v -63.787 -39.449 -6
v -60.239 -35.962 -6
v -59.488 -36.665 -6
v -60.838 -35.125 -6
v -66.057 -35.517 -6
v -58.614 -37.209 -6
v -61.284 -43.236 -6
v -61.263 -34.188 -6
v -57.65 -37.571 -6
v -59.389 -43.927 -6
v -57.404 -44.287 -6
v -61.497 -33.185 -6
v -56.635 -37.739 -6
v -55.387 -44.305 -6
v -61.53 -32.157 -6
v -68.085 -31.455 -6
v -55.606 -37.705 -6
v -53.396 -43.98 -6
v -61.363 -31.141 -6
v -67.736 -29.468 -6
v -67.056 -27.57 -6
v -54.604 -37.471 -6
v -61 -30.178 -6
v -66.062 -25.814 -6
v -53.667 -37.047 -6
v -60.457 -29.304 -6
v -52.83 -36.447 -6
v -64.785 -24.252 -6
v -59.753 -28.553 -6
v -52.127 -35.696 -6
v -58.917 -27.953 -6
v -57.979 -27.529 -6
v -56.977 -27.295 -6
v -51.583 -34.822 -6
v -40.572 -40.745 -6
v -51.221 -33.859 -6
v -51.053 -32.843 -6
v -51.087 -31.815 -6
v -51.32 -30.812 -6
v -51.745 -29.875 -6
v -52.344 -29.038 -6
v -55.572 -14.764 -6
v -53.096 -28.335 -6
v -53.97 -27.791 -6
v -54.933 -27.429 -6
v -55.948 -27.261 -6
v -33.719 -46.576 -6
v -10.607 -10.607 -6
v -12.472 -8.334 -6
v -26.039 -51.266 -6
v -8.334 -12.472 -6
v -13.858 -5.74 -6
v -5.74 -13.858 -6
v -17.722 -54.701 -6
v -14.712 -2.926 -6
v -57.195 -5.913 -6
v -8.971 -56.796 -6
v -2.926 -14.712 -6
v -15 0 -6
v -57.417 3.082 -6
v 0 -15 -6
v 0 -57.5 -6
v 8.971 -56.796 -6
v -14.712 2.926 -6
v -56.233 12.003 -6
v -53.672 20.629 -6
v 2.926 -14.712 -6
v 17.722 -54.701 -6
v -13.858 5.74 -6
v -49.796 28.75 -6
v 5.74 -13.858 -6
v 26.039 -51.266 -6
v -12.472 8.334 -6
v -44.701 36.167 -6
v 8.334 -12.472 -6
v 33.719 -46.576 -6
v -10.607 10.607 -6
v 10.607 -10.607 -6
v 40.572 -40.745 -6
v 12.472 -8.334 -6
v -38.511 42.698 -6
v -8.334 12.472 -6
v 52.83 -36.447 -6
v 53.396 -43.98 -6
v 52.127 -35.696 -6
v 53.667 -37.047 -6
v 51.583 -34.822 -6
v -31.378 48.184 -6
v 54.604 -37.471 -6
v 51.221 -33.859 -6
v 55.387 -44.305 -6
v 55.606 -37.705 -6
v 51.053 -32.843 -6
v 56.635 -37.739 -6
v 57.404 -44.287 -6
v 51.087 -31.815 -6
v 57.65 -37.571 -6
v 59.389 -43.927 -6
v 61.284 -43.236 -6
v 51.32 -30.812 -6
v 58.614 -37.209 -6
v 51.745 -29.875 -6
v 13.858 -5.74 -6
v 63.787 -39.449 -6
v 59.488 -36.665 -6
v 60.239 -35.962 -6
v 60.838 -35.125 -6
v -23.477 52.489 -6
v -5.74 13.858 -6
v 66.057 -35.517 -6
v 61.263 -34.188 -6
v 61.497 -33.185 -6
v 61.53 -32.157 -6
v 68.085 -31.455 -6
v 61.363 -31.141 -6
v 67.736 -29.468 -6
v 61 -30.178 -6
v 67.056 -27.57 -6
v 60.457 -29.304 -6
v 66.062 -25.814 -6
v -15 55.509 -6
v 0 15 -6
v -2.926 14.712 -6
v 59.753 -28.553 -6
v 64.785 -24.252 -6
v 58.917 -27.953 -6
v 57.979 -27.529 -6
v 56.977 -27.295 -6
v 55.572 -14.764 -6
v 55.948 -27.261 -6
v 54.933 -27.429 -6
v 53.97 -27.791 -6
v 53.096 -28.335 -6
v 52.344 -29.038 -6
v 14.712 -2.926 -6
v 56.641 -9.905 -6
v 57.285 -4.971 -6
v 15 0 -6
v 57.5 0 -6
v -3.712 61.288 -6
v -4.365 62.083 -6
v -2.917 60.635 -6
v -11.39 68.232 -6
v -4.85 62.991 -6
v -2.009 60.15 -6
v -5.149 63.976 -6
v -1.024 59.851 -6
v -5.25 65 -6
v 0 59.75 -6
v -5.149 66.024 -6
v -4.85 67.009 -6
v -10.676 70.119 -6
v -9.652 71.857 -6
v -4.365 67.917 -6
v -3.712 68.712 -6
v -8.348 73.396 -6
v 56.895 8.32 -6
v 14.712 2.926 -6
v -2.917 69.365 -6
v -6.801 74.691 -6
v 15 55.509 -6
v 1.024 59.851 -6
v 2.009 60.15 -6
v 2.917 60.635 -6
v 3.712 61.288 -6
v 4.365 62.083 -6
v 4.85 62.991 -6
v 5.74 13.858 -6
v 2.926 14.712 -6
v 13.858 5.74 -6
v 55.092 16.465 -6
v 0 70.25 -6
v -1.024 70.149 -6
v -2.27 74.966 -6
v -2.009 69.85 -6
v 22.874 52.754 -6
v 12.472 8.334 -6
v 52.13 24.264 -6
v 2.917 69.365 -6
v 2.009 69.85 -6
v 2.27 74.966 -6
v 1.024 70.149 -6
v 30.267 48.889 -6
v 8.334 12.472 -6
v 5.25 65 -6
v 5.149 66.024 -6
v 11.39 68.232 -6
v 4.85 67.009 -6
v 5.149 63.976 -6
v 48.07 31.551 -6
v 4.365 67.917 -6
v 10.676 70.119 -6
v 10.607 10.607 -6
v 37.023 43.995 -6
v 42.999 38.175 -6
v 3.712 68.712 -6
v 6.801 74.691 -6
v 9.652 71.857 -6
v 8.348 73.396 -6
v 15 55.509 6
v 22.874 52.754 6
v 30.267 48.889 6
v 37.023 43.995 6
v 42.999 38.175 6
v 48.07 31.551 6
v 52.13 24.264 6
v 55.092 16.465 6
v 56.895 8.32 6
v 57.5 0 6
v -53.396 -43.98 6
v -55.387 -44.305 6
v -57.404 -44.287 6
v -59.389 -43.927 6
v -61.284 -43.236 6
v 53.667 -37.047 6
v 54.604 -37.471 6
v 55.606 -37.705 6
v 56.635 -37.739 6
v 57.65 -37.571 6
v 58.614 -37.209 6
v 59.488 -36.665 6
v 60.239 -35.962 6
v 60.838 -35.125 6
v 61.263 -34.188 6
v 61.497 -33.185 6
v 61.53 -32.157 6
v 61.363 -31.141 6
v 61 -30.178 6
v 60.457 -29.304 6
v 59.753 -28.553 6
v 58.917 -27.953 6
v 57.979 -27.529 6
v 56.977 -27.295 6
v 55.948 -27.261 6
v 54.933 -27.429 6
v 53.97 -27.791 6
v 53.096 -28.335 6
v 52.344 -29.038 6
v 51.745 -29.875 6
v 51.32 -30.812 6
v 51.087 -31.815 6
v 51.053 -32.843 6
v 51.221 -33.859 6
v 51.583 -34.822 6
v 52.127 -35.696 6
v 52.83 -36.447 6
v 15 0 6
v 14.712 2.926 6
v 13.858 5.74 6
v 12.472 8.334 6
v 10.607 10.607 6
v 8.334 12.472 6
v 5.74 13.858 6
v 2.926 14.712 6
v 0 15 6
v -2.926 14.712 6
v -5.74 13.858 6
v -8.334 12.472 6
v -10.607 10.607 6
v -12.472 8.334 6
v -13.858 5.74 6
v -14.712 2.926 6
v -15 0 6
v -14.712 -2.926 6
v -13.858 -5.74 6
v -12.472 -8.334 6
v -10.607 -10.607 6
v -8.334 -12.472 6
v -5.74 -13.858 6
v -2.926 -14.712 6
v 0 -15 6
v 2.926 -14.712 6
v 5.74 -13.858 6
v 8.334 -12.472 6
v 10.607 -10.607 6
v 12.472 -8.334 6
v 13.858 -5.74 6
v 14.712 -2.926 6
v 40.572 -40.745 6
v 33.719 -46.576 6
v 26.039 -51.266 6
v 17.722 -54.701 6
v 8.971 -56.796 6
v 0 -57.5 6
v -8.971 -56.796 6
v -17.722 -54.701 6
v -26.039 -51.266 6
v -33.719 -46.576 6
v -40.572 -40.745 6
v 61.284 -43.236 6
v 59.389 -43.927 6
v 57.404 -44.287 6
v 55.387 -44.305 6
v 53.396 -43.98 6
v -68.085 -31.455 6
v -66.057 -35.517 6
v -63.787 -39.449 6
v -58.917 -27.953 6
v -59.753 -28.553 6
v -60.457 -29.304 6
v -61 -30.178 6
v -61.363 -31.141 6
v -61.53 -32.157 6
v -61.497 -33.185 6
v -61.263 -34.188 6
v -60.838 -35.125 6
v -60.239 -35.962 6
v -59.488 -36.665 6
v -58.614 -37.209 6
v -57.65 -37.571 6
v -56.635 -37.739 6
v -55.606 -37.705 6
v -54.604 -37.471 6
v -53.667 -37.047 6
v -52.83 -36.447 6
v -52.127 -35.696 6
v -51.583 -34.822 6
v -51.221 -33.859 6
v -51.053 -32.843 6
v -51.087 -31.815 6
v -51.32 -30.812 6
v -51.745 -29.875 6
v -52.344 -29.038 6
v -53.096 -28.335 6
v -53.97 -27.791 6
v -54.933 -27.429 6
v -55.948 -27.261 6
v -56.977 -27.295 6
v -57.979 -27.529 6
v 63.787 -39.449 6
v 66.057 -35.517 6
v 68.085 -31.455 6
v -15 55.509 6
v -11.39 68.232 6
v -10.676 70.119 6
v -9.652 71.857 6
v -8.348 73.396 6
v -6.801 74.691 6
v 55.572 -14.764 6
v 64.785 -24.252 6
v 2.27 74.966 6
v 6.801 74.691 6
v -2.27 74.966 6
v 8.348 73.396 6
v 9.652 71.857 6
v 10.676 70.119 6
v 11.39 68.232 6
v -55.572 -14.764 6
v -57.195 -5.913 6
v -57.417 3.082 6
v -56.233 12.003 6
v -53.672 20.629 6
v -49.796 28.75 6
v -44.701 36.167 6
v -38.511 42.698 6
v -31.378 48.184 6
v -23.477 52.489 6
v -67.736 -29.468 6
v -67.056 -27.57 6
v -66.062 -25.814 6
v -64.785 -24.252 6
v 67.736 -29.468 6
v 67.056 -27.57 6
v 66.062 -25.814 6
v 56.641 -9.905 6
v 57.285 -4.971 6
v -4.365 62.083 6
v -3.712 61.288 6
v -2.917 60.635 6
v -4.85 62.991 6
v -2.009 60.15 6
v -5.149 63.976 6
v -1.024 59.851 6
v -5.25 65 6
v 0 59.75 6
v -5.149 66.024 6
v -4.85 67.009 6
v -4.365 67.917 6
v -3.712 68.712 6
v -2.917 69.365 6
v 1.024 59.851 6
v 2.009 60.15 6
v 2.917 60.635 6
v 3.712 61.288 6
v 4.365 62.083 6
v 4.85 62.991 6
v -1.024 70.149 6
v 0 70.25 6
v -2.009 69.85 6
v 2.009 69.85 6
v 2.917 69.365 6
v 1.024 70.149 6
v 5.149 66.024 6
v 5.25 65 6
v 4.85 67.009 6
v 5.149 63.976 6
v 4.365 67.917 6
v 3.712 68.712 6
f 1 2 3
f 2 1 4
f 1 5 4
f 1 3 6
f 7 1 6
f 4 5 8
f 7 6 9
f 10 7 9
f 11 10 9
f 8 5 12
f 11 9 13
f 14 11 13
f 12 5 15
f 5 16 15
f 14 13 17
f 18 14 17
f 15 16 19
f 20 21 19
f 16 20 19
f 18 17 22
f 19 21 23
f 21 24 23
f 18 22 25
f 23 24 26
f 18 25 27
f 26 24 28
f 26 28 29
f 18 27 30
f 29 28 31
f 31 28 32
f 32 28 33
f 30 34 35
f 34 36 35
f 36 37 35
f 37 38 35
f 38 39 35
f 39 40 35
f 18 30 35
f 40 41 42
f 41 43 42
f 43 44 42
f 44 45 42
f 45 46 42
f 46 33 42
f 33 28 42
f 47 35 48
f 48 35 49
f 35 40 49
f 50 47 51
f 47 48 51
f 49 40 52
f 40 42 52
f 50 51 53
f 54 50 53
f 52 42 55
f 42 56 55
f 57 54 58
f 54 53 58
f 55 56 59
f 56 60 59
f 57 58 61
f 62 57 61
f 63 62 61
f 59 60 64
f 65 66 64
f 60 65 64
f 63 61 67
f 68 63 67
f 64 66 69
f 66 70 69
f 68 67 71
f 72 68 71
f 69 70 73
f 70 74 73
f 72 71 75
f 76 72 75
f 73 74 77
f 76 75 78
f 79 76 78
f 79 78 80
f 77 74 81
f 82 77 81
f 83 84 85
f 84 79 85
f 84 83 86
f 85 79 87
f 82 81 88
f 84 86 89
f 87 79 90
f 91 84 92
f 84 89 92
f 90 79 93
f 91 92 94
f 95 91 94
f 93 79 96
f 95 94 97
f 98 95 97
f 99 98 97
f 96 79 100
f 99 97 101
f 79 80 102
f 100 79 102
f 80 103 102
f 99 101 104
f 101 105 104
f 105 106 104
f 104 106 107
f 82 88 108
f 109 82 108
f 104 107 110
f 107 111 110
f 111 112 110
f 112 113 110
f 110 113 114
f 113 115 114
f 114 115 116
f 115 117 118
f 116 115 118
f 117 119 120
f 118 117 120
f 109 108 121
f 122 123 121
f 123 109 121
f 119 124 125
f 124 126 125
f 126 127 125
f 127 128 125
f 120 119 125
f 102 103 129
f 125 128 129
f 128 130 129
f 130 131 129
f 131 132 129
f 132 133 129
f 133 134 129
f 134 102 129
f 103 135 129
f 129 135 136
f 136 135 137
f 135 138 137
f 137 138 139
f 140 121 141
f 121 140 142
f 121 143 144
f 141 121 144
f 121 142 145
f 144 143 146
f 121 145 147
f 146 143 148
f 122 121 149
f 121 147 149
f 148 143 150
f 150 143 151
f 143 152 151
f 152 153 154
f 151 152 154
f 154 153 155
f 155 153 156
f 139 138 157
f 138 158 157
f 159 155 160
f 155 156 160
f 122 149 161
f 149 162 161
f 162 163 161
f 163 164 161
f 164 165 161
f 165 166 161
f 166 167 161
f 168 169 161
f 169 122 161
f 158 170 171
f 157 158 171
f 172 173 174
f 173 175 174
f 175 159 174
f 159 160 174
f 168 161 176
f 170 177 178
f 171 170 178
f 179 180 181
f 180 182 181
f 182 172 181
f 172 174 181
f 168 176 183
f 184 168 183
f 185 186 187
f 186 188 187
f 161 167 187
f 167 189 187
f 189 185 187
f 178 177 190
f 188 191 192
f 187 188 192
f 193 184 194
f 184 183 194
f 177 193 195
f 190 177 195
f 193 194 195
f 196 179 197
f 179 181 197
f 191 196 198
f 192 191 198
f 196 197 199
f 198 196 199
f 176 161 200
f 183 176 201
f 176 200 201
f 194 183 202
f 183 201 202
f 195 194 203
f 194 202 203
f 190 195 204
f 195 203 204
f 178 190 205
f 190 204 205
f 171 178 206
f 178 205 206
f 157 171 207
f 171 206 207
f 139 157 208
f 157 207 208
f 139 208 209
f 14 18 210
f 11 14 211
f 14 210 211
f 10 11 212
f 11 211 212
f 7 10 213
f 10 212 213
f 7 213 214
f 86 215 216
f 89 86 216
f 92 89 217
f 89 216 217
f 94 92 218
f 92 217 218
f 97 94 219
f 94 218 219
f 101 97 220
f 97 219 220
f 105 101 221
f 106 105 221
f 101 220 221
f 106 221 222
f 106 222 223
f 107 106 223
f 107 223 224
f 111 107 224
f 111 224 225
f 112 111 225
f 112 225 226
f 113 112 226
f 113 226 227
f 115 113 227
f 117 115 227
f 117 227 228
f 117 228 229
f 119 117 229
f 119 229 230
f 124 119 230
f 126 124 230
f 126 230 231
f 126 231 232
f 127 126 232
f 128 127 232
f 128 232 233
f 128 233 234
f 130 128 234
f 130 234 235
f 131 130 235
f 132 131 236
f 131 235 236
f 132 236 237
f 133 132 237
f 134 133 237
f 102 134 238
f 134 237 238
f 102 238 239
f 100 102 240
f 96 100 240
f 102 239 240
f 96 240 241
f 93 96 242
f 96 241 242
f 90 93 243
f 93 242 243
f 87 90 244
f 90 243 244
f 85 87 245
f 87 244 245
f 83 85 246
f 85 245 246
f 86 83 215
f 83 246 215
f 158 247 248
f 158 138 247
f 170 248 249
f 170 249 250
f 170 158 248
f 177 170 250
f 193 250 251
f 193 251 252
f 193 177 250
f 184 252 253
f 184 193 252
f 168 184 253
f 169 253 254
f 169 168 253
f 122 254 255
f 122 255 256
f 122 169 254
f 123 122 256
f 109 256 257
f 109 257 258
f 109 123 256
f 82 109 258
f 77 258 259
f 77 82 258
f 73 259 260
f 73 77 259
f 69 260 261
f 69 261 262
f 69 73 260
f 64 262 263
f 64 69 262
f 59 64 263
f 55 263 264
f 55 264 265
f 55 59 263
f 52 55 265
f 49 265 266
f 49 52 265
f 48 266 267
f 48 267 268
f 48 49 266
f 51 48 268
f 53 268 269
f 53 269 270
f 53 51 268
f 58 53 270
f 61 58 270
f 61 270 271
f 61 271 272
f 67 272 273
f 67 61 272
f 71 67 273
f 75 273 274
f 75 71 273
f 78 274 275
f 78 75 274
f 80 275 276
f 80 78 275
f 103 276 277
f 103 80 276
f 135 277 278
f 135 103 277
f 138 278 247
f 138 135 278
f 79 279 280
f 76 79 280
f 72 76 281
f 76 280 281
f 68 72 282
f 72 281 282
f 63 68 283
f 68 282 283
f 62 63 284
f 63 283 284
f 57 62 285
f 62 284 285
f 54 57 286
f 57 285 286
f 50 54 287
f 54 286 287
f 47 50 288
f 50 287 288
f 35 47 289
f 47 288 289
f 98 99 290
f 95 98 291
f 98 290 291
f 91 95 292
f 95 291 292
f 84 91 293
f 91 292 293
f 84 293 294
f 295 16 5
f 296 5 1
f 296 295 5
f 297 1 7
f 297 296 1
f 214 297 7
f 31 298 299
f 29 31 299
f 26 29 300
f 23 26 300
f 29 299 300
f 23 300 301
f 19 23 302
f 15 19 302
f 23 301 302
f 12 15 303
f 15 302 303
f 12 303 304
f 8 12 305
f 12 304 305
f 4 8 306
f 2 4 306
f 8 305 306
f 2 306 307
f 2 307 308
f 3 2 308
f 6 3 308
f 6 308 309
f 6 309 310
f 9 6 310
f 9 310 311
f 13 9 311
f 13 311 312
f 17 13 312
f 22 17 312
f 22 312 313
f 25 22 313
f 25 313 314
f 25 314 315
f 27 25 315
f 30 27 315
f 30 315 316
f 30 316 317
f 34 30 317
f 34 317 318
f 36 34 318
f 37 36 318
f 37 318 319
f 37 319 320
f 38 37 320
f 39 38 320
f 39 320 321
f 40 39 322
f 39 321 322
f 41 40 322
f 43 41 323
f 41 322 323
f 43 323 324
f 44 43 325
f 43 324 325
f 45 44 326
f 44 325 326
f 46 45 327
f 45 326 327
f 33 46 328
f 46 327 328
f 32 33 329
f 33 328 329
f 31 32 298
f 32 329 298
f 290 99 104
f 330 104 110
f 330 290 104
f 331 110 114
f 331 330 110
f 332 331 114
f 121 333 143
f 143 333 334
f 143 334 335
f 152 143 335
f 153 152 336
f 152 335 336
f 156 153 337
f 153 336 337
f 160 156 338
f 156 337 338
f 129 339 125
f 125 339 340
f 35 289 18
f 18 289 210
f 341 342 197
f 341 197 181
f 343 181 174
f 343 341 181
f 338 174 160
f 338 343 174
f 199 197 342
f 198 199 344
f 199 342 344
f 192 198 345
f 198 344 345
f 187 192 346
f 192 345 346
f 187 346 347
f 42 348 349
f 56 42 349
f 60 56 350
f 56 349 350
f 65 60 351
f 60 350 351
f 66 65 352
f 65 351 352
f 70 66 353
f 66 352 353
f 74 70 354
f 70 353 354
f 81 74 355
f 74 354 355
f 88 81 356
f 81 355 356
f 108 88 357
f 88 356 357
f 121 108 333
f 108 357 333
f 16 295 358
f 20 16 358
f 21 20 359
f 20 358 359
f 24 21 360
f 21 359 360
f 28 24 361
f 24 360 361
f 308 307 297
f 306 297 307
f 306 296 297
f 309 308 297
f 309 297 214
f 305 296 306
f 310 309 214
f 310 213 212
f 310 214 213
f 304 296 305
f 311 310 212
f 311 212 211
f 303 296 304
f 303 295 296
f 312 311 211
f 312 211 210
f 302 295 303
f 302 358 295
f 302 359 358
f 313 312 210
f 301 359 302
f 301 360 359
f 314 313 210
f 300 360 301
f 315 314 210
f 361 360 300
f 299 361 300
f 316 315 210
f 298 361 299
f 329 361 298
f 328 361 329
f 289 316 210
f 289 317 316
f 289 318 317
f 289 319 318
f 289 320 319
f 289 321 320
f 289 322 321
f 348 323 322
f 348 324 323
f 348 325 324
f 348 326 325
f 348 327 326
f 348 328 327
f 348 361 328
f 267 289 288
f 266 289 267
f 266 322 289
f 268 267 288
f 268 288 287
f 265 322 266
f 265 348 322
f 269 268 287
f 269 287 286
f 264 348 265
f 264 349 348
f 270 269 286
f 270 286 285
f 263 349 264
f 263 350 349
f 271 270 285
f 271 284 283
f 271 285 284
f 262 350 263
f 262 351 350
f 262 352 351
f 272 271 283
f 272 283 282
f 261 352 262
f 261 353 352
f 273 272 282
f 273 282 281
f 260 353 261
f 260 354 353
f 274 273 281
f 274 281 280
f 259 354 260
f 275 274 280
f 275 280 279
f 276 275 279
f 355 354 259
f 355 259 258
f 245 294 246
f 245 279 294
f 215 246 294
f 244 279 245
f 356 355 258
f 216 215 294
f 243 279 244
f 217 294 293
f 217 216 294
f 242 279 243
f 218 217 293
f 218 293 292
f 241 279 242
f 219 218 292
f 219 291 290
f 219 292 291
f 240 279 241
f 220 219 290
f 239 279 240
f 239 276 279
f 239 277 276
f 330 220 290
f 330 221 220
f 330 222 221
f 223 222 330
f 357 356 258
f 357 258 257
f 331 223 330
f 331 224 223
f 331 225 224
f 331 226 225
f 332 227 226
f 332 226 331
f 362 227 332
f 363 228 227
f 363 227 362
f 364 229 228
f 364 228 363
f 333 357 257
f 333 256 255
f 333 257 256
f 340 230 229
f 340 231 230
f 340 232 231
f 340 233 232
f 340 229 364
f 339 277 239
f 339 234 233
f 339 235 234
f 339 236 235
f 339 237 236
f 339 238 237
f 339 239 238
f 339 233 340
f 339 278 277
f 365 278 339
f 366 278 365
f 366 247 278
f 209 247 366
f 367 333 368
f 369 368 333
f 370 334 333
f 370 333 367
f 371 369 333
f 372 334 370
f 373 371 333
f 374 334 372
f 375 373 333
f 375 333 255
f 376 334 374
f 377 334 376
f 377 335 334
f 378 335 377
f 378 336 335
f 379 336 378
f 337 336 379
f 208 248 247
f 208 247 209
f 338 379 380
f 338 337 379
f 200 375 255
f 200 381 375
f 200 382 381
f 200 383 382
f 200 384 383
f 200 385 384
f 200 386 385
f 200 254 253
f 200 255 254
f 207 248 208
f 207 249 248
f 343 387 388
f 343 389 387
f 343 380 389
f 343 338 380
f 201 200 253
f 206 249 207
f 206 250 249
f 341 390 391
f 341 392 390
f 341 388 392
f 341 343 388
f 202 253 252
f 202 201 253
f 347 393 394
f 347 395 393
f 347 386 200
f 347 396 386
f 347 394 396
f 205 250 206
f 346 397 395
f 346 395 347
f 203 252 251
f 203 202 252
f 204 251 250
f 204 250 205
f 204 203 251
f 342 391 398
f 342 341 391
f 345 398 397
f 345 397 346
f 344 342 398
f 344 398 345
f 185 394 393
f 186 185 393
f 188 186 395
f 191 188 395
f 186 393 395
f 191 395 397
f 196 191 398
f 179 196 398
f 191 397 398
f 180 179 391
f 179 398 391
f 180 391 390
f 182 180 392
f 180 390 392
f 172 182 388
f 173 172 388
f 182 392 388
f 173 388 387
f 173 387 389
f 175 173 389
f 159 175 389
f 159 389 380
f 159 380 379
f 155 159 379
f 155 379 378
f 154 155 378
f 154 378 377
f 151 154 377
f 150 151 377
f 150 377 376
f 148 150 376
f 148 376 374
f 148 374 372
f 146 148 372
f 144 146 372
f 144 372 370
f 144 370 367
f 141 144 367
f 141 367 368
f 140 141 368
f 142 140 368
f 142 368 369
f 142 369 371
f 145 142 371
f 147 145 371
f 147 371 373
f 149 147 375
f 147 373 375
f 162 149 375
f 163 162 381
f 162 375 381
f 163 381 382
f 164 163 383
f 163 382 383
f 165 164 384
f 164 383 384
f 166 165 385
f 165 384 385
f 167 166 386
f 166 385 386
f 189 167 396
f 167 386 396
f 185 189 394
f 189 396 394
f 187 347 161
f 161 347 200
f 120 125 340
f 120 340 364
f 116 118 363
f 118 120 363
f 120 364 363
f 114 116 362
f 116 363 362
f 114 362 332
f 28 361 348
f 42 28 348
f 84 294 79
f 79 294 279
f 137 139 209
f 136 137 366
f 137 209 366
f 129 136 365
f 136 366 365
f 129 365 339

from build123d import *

# Parameters (mm, degrees)
ESBO_O1_R             = 75
ESBO_O1_R_2           = 15
EXTRUS_O1_DEPTH       = 6
ESBO_O2_R             = 5.25
CORTE_EXTRUS_O1_DEPTH = 107.742681248
CIRPATTERN1_COUNT     = 3
ESBO_O3_R             = 94.650975841
ESBO_O3_R_2           = 75
CORTE_EXTRUS_O3_DEPTH = 107.742681248


with BuildPart() as part:
    # Esboço1 → Extrusão1 (new, symmetric)
    with BuildSketch(Plane.XY):
        Circle(ESBO_O1_R)
        Circle(ESBO_O1_R_2, mode=Mode.SUBTRACT)
    extrude(amount=EXTRUS_O1_DEPTH, both=True)

    # Esboço2 → Corte-extrusão1 (cut, through all)
    with BuildSketch(Plane.XY.offset(6)):
        with Locations((0, 65)):
            Circle(ESBO_O2_R)
    corte_extrus_o1 = extrude(amount=-CORTE_EXTRUS_O1_DEPTH, mode=Mode.SUBTRACT)

    # CirPattern1: Corte-extrusão1 ×3 about axis
    cirpattern1_axis = Axis((0, 0, 0), (0, 0, 1))
    for i in range(1, CIRPATTERN1_COUNT):
        add(corte_extrus_o1.rotate(cirpattern1_axis, i * 360 / CIRPATTERN1_COUNT), mode=Mode.SUBTRACT)

    # Esboço3 → Corte-extrusão3 (cut, through all)
    # profile 1 of 4: a face of its own
    with BuildSketch(Plane.XY.offset(6)):
        Circle(ESBO_O3_R)
        Circle(ESBO_O3_R_2, mode=Mode.SUBTRACT)
    # profile 2 of 4: a face of its own
    with BuildSketch(Plane.XY.offset(6)):
        with BuildLine():
            ThreePointArc((-11.389775772, 68.231933262), (-9.651857518, 71.856677855), (-6.801268948, 74.690981656))
            ThreePointArc((-6.801268948, 74.690981656), (-64.951905284, 37.5), (-68.084922021, -31.455419141))
            ThreePointArc((-68.084922021, -31.455419141), (-67.055637213, -27.569585123), (-64.78547544, -24.252131468))
            Line((-64.78547544, -24.252131468), (-55.572211308, -14.764123082))
            ThreePointArc((-55.572211308, -14.764123082), (-49.796460718, 28.75), (-15, 55.509008278))
            Line((-15, 55.509008278), (-11.389775772, 68.231933262))
        make_face()
    # profile 3 of 4: a face of its own
    with BuildSketch(Plane.XY.offset(6)):
        with BuildLine():
            ThreePointArc((-53.395699668, -43.979801793), (-57.403779695, -44.287092732), (-61.283653073, -43.235562515))
            ThreePointArc((-61.283653073, -43.235562515), (0, -75), (61.283653073, -43.235562515))
            ThreePointArc((61.283653073, -43.235562515), (57.403779695, -44.287092732), (53.395699668, -43.979801793))
            Line((53.395699668, -43.979801793), (40.572211308, -40.744885196))
            ThreePointArc((40.572211308, -40.744885196), (0, -57.5), (-40.572211308, -40.744885196))
            Line((-40.572211308, -40.744885196), (-53.395699668, -43.979801793))
        make_face()
    # profile 4 of 4: a face of its own
    with BuildSketch(Plane.XY.offset(6)):
        with BuildLine():
            ThreePointArc((6.801268948, 74.690981656), (9.651857518, 71.856677855), (11.389775772, 68.231933262))
            Line((11.389775772, 68.231933262), (15, 55.509008278))
            ThreePointArc((15, 55.509008278), (45.654955919, 34.955328635), (57.5, 0))
            ThreePointArc((57.5, 0), (57.016015952, -7.444724636), (55.572211308, -14.764123082))
            Line((55.572211308, -14.764123082), (64.78547544, -24.252131468))
            ThreePointArc((64.78547544, -24.252131468), (67.055637213, -27.569585123), (68.084922021, -31.455419141))
            ThreePointArc((68.084922021, -31.455419141), (73.250833277, -16.10327371), (75, 0))
            ThreePointArc((75, 0), (55.385445611, 50.571260756), (6.801268948, 74.690981656))
        make_face()
    extrude(amount=-CORTE_EXTRUS_O3_DEPTH, mode=Mode.SUBTRACT)


solid = part.part
